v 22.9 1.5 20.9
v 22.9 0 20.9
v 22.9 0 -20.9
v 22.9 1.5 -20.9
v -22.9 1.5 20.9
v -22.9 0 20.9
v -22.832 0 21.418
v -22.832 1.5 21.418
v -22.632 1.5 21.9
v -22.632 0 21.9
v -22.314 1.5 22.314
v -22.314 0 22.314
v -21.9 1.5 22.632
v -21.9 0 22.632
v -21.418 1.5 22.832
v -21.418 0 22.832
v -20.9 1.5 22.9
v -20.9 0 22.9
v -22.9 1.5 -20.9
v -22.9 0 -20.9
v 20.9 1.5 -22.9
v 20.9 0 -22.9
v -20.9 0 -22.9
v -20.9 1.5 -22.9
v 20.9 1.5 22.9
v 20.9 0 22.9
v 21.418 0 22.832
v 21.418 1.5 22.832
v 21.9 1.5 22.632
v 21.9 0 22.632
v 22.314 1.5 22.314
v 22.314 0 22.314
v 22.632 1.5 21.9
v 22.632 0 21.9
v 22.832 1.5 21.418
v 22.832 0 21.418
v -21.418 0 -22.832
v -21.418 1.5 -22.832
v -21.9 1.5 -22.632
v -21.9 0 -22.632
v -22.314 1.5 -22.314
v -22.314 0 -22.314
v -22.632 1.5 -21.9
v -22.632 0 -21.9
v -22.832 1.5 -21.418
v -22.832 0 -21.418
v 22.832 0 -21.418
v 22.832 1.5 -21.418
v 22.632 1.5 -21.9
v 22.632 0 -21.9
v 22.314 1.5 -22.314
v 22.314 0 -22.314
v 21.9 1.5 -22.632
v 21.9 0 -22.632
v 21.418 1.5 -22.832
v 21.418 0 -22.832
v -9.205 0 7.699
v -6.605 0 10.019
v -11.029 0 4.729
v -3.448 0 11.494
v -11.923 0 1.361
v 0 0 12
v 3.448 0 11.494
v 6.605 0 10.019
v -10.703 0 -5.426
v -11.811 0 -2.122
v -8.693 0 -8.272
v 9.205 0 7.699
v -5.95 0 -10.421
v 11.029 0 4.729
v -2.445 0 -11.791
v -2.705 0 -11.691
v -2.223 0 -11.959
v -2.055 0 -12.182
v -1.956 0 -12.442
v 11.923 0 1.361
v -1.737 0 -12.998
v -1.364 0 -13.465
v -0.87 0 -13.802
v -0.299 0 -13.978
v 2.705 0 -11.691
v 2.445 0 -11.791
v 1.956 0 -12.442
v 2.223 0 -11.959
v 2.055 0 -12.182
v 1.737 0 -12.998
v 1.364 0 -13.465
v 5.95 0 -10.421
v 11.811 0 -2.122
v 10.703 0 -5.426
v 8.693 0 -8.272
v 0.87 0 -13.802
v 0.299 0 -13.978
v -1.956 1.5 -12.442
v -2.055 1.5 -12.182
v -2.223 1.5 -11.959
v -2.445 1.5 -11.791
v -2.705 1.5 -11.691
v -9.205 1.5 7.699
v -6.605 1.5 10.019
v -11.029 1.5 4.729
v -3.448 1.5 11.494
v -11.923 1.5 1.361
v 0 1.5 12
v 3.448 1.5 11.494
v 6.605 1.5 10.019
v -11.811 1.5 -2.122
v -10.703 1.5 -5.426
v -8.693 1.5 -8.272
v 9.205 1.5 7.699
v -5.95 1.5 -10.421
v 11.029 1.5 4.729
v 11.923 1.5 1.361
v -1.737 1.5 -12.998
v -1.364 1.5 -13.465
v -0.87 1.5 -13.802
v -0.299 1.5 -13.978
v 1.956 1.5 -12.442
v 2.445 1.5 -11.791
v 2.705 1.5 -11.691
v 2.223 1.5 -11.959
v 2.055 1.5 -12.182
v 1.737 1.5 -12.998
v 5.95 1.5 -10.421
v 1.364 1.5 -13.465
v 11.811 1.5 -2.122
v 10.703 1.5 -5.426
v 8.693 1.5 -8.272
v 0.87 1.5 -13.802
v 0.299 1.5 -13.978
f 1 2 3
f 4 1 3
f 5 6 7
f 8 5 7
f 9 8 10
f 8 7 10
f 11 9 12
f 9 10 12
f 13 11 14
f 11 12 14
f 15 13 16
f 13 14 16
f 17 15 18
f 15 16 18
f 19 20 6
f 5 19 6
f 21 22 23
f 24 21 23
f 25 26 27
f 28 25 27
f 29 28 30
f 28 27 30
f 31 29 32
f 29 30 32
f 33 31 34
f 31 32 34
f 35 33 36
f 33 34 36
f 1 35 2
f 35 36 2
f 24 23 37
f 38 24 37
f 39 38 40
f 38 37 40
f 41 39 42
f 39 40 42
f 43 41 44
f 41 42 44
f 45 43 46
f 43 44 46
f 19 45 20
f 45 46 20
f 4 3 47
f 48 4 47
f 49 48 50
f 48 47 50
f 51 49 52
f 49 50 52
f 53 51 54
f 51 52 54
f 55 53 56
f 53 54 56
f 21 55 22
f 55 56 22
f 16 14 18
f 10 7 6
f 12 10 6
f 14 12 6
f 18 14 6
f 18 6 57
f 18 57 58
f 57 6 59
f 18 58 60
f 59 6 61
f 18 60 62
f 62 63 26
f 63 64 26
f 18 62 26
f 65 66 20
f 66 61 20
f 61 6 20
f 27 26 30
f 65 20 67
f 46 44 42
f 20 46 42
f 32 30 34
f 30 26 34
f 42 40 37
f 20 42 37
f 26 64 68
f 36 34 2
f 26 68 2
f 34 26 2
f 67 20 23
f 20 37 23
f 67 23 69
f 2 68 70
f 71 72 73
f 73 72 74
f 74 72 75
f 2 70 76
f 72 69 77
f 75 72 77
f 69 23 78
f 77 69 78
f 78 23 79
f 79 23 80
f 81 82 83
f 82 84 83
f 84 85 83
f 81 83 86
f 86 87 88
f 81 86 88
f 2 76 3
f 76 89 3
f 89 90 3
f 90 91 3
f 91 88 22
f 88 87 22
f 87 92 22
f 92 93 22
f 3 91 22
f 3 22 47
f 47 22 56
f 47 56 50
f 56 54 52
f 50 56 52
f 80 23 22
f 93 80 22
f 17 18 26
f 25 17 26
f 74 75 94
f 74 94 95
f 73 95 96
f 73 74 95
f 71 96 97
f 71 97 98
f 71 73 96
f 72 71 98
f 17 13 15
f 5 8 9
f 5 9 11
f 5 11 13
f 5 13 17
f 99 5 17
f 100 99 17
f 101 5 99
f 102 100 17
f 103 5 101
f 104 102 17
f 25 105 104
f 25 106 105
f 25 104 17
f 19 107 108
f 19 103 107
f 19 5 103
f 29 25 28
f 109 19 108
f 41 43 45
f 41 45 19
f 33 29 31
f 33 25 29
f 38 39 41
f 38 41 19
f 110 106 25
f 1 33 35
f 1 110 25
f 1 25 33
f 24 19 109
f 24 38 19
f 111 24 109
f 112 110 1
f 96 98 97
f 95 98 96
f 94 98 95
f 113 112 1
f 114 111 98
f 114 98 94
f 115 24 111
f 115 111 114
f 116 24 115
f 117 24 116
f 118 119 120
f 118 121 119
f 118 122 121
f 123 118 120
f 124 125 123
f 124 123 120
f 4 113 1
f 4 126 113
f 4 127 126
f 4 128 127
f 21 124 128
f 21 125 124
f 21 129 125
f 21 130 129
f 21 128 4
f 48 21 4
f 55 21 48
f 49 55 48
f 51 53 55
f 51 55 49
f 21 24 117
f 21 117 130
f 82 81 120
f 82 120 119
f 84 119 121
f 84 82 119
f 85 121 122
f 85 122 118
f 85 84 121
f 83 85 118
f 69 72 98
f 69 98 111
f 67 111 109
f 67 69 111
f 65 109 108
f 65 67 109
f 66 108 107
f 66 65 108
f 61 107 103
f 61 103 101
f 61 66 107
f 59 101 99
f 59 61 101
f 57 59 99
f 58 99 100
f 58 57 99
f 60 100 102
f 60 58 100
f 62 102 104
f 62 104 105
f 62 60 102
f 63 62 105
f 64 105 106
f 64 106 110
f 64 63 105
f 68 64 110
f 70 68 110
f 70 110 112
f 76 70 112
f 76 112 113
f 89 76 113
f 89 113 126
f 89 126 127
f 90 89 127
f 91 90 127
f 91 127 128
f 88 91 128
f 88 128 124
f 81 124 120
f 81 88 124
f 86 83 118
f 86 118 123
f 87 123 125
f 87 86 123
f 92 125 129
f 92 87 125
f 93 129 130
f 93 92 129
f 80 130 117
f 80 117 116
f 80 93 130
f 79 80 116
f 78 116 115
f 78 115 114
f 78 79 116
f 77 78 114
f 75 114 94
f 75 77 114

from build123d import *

# Parameters (mm, degrees)
Y_KSEKLIK_EKSTR_ZYON1_DEPTH = 1.5


with BuildPart() as part:
    # Çizim1 → Yükseklik-Ekstrüzyon1 (new body)
    with BuildSketch(Plane(origin=(0, 0, 0), x_dir=(1, 0, 0), z_dir=(0, 1, 0))):
        with BuildLine():
            Line((-20.9, -22.9), (20.9, -22.9))
            ThreePointArc((20.9, -22.9), (22.314213562, -22.314213562), (22.9, -20.9))
            Line((22.9, -20.9), (22.9, 20.9))
            ThreePointArc((22.9, 20.9), (22.314213562, 22.314213562), (20.9, 22.9))
            Line((20.9, 22.9), (-20.9, 22.9))
            ThreePointArc((-20.9, 22.9), (-22.314213562, 22.314213562), (-22.9, 20.9))
            Line((-22.9, 20.9), (-22.9, -20.9))
            ThreePointArc((-22.9, -20.9), (-22.314213562, -22.314213562), (-20.9, -22.9))
        make_face()
        with BuildLine():
            ThreePointArc((-2.705036995, 11.691140871), (0, -12), (2.705036995, 11.691140871))
            ThreePointArc((2.705036995, 11.691140871), (2.222647508, 11.958998982), (1.955748834, 12.441919973))
            ThreePointArc((1.955748834, 12.441919973), (0, 14), (-1.955748834, 12.441919973))
            ThreePointArc((-1.955748834, 12.441919973), (-2.222647508, 11.958998982), (-2.705036995, 11.691140871))
        make_face(mode=Mode.SUBTRACT)
    extrude(amount=Y_KSEKLIK_EKSTR_ZYON1_DEPTH)


solid = part.part
